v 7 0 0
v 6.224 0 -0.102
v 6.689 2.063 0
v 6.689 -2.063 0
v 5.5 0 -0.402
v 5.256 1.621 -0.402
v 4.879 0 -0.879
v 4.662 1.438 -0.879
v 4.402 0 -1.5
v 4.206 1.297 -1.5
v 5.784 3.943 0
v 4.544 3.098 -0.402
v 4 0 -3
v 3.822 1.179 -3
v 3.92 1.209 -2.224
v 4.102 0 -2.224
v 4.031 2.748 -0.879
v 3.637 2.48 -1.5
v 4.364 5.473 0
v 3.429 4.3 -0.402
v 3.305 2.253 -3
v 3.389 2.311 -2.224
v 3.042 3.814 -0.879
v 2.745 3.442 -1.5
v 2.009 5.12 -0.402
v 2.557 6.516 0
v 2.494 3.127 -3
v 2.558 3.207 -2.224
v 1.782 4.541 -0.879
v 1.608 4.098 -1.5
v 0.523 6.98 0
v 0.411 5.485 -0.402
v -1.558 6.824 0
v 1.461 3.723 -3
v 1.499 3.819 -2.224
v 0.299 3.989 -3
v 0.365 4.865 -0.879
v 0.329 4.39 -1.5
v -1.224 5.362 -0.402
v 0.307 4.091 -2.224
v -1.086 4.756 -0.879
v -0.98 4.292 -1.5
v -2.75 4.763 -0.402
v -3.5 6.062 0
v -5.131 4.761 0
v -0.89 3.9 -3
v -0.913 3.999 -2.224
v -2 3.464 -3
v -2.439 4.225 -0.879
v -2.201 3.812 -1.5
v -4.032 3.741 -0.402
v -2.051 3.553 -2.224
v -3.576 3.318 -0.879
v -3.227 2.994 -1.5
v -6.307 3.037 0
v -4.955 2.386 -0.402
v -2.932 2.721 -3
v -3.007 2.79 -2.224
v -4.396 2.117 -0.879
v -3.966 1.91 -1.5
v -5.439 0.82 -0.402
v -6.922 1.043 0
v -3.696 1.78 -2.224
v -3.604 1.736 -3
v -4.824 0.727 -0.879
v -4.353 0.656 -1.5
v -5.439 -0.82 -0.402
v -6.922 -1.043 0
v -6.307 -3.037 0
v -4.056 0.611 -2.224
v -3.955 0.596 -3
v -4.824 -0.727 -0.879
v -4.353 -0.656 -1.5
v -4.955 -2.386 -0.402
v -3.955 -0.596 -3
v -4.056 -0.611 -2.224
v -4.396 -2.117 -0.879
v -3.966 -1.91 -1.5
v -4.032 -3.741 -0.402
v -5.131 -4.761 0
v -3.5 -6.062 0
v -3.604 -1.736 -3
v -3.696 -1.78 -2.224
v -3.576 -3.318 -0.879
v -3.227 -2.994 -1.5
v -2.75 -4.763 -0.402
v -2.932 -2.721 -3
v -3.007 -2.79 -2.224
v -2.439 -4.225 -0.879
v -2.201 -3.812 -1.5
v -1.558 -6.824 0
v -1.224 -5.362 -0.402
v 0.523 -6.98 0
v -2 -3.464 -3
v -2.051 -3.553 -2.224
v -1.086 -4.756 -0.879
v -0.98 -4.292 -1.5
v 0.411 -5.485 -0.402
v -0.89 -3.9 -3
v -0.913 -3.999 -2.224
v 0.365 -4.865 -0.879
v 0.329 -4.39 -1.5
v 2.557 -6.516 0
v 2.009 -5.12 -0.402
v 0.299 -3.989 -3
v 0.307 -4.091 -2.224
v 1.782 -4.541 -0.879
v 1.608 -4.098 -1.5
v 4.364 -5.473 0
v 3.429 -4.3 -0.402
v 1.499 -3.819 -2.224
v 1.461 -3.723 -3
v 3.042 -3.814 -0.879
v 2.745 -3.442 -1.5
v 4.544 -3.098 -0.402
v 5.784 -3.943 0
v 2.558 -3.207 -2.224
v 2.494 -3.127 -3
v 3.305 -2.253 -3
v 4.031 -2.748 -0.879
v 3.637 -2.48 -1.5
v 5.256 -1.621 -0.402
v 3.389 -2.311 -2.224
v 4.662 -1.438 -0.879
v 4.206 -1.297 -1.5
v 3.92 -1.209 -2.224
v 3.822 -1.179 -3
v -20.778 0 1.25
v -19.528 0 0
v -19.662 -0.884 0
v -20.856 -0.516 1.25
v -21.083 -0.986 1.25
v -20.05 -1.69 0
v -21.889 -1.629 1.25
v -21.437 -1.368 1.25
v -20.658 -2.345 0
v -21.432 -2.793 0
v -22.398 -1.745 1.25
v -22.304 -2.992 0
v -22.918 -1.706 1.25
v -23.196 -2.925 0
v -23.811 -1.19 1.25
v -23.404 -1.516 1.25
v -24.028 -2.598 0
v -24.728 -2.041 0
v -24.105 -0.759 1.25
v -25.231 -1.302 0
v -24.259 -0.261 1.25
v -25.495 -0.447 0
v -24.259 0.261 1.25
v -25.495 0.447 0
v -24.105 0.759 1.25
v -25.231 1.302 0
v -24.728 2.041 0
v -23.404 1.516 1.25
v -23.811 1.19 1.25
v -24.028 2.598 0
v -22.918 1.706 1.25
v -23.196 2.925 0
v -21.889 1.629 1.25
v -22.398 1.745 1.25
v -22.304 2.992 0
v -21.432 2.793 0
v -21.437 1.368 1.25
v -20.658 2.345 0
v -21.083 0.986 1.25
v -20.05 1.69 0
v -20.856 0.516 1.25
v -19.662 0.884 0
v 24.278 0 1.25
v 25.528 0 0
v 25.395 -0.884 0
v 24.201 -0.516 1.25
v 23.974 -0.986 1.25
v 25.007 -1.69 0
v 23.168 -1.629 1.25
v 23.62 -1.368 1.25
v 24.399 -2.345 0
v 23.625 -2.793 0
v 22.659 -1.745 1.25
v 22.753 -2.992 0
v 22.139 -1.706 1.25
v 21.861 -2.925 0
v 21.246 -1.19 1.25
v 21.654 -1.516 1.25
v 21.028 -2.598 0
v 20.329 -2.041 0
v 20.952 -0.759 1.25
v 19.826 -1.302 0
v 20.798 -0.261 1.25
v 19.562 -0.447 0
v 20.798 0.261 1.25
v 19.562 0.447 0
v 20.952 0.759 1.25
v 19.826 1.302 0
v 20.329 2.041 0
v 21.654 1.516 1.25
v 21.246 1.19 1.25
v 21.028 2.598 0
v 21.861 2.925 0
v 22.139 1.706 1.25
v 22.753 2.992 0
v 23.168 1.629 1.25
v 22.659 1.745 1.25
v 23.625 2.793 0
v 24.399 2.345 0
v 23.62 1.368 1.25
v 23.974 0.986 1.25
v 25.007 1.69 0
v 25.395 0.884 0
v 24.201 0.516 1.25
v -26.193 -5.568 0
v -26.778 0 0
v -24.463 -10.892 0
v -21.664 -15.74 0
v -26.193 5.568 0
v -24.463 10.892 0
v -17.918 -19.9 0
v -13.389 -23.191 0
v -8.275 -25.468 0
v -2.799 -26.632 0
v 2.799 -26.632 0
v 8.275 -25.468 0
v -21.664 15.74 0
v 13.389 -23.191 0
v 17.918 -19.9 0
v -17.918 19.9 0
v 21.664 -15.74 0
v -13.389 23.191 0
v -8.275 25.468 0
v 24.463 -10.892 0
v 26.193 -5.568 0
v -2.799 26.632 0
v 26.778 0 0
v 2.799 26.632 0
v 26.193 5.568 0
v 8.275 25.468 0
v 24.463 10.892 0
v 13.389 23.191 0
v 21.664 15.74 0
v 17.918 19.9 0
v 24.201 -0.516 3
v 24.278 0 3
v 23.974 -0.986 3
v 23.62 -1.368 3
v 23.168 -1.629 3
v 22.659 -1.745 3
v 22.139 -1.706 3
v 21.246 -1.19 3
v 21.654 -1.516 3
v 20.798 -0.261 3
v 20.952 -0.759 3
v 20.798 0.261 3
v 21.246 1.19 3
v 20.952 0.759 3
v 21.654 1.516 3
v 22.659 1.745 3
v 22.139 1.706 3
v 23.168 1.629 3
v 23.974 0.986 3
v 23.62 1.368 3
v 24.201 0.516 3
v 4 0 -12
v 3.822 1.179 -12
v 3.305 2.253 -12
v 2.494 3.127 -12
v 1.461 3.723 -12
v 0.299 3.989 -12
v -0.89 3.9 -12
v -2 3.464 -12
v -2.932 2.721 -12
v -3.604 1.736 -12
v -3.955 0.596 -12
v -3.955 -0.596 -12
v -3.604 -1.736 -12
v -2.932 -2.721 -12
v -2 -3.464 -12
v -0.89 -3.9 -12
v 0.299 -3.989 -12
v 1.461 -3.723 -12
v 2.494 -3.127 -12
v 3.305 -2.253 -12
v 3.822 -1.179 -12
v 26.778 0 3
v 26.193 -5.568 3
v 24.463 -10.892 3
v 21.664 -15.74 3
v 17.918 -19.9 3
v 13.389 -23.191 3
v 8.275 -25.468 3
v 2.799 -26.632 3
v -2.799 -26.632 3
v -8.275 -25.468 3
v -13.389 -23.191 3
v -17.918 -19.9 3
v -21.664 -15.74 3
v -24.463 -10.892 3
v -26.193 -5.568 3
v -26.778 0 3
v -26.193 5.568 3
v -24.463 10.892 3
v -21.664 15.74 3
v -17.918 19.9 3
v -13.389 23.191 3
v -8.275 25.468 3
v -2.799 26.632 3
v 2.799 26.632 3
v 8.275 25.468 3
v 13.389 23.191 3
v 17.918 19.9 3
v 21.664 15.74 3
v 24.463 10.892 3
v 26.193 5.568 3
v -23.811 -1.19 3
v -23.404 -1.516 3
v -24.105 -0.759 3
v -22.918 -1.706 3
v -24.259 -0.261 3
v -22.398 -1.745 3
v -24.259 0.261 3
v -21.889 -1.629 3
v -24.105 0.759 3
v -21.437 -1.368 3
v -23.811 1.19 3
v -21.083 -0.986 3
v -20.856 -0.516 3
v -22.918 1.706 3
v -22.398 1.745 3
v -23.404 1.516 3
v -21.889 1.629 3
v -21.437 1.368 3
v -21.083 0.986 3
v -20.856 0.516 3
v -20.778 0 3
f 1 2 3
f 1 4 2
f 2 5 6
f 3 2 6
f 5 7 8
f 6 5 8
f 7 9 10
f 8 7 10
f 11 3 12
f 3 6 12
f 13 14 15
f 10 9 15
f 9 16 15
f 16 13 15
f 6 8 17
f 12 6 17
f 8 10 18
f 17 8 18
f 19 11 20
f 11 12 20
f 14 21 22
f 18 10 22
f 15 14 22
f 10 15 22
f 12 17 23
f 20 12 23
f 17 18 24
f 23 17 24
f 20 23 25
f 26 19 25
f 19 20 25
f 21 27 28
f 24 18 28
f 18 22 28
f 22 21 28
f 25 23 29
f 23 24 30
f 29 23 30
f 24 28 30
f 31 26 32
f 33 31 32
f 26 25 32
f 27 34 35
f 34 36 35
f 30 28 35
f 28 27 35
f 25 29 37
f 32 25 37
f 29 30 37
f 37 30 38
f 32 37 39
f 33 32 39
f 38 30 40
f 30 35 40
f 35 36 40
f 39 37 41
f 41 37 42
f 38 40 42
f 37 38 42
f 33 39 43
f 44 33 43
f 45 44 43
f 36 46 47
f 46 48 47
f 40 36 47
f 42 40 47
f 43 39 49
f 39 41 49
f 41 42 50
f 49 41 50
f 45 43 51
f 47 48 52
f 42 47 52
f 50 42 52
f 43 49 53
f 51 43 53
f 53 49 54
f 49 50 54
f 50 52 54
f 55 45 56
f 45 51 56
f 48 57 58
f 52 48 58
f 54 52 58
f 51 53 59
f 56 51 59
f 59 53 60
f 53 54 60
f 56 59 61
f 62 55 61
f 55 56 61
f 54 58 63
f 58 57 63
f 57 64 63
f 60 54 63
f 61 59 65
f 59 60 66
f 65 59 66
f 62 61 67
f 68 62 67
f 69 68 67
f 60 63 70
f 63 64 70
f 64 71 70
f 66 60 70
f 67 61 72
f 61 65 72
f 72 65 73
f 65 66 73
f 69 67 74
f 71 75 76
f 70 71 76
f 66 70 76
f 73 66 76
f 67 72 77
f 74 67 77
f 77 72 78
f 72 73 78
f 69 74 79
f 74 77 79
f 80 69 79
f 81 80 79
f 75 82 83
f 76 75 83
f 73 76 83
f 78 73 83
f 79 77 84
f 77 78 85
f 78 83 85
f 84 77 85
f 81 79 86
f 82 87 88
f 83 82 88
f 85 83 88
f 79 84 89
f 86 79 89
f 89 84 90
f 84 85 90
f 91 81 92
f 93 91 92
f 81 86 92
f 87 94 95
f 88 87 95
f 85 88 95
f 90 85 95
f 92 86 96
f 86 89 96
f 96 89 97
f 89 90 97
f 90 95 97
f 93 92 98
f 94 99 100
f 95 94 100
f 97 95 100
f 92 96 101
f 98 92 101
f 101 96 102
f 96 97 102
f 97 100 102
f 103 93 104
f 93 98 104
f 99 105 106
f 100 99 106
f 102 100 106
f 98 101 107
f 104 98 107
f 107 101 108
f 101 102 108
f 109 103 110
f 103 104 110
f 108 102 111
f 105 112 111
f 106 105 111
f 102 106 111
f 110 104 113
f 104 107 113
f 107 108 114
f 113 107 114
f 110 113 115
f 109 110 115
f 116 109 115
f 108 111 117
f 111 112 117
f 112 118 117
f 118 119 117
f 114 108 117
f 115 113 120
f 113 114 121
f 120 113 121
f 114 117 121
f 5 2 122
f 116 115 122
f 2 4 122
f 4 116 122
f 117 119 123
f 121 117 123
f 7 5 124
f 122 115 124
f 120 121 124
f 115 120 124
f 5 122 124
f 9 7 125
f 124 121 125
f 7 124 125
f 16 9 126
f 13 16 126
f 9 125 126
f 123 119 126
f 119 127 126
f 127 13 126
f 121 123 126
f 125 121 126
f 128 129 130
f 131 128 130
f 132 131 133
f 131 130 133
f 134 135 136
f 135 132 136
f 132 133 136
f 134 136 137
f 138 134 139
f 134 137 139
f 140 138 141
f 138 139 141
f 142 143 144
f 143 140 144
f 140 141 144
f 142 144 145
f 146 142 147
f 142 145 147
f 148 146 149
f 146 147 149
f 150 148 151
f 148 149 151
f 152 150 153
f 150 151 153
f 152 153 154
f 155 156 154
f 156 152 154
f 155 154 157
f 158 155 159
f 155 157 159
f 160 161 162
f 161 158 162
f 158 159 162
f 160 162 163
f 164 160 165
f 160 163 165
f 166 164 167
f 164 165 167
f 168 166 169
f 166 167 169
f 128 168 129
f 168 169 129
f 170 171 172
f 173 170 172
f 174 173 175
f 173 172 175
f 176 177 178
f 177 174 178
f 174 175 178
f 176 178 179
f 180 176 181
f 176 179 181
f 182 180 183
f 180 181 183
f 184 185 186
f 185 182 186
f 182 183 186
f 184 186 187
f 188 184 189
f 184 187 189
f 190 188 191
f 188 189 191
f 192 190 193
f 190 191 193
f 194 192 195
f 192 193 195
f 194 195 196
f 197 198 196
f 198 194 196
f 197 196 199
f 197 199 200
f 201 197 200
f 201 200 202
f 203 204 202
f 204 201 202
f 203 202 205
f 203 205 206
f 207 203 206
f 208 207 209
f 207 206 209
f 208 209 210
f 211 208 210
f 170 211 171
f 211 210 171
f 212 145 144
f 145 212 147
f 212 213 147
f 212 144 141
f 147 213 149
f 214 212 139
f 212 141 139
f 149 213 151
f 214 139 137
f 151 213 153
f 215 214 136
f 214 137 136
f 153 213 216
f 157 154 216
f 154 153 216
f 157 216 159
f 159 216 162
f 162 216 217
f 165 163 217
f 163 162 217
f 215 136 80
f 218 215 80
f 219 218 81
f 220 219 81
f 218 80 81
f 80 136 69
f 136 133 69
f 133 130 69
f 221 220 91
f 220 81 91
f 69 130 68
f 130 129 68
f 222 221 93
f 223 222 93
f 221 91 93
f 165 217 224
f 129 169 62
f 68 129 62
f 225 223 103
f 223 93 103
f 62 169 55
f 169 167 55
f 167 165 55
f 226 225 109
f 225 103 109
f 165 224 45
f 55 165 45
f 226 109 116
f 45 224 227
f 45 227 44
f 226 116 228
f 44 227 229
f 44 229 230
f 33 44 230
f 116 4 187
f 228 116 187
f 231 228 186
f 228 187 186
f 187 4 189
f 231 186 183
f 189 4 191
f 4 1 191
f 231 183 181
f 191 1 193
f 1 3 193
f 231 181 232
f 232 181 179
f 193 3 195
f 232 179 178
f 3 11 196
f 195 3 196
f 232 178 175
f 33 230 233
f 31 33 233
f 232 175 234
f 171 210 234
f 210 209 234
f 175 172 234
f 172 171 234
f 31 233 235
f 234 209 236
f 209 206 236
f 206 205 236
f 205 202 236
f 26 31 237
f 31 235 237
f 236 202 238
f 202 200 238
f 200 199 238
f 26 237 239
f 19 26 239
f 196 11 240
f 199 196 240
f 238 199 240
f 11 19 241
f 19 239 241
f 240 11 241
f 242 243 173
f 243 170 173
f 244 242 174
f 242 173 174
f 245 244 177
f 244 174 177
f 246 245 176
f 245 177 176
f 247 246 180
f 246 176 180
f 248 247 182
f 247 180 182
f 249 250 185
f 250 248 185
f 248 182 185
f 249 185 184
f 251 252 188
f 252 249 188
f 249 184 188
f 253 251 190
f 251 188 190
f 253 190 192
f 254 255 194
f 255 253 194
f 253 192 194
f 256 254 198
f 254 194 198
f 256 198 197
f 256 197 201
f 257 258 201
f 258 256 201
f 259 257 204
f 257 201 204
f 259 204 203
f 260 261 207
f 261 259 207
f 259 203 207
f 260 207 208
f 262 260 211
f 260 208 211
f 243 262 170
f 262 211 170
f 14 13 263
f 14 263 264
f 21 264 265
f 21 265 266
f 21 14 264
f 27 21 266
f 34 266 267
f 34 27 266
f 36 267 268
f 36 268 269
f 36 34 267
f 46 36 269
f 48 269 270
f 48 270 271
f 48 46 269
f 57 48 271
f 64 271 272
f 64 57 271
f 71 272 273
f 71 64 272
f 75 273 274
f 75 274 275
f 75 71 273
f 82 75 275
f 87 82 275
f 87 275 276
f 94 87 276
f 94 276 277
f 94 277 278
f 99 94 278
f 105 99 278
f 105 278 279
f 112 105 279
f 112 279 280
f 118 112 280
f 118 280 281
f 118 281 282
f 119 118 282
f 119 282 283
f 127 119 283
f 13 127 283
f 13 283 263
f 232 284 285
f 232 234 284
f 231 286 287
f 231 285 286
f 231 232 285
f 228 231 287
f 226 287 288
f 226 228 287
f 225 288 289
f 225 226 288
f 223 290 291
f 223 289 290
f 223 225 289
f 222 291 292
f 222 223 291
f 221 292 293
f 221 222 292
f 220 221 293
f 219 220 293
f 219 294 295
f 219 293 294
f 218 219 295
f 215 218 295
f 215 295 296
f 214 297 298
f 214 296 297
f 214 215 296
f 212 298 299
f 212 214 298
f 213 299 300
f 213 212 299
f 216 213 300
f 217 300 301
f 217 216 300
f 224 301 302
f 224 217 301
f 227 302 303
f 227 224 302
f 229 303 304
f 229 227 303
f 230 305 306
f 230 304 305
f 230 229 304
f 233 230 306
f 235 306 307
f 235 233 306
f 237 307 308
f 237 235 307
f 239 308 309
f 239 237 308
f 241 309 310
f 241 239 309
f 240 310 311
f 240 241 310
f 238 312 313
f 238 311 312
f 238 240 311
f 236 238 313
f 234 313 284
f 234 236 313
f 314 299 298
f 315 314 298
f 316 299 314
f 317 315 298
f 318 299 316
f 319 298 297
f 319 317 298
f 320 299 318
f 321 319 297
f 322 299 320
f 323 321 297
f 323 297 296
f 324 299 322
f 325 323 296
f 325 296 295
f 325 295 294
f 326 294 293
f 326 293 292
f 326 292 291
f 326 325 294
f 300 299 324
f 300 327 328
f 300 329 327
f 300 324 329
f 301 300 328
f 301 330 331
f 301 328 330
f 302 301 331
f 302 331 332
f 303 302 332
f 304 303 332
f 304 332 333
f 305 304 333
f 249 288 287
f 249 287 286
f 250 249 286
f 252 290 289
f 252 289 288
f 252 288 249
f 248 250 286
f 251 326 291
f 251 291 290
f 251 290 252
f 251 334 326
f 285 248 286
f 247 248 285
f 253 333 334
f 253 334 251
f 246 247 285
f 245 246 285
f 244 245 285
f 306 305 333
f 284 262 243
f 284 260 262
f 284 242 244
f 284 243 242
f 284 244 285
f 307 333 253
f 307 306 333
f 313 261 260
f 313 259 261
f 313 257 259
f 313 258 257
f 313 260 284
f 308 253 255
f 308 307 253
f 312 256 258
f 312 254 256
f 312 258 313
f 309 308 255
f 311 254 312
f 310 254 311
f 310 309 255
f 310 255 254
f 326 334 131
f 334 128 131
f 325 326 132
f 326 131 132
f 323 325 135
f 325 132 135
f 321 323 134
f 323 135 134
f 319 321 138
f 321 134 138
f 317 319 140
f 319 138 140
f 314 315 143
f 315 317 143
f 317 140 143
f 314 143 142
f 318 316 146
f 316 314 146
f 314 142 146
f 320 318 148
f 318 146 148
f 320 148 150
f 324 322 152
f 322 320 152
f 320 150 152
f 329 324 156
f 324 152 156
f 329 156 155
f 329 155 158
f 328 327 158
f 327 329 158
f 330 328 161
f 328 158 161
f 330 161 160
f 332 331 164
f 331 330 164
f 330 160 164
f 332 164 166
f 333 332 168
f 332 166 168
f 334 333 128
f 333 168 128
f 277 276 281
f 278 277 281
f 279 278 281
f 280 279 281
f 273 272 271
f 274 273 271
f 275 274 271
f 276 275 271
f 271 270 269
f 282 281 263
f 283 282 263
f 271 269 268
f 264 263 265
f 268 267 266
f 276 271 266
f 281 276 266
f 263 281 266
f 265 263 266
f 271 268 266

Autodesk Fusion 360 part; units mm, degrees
sketch "Sketch1" plane through (0, 0, 0) normal (0, 0, 1) x (1, 0, 0)
  circle A0 centre (0, 0) radius 26.7785
  line L0 (0, 0) -> (-26.7785, 0) construction
  line L1 (0, 0) -> (26.7785, 0) construction
  circle A1 centre (-22.5285, 0) radius 3
  circle A2 centre (-22.5285, 0) radius 1.75
  circle A3 centre (22.5285, 0) radius 3
  circle A4 centre (22.5285, 0) radius 1.75
  circle A5 centre (0, 0) radius 4
  dimension "d1" = 53.557
  dimension "d2" = 6
  dimension "d3" = 3.5
  dimension "d4" = 4.25
  dimension "d5" = 6
  dimension "d6" = 3.5
  dimension "d8" = 4.25
  dimension "d12" = 8
extrude "Extrude1" add sketch "Sketch1" along normal blind 3 contours A0 | A1 | A3 | A5
chamfer "Chamfer1" distance 1.25 angle 45 2 edges at (20.8969, 0.6328, 0) (-24.1601, 0.6328, 0)
extrude "Extrude2" add sketch "Sketch1" against normal blind 12 contours A5
fillet "Fillet1" radius 3 1 edges at (-3.7293, -1.4465, 0)
